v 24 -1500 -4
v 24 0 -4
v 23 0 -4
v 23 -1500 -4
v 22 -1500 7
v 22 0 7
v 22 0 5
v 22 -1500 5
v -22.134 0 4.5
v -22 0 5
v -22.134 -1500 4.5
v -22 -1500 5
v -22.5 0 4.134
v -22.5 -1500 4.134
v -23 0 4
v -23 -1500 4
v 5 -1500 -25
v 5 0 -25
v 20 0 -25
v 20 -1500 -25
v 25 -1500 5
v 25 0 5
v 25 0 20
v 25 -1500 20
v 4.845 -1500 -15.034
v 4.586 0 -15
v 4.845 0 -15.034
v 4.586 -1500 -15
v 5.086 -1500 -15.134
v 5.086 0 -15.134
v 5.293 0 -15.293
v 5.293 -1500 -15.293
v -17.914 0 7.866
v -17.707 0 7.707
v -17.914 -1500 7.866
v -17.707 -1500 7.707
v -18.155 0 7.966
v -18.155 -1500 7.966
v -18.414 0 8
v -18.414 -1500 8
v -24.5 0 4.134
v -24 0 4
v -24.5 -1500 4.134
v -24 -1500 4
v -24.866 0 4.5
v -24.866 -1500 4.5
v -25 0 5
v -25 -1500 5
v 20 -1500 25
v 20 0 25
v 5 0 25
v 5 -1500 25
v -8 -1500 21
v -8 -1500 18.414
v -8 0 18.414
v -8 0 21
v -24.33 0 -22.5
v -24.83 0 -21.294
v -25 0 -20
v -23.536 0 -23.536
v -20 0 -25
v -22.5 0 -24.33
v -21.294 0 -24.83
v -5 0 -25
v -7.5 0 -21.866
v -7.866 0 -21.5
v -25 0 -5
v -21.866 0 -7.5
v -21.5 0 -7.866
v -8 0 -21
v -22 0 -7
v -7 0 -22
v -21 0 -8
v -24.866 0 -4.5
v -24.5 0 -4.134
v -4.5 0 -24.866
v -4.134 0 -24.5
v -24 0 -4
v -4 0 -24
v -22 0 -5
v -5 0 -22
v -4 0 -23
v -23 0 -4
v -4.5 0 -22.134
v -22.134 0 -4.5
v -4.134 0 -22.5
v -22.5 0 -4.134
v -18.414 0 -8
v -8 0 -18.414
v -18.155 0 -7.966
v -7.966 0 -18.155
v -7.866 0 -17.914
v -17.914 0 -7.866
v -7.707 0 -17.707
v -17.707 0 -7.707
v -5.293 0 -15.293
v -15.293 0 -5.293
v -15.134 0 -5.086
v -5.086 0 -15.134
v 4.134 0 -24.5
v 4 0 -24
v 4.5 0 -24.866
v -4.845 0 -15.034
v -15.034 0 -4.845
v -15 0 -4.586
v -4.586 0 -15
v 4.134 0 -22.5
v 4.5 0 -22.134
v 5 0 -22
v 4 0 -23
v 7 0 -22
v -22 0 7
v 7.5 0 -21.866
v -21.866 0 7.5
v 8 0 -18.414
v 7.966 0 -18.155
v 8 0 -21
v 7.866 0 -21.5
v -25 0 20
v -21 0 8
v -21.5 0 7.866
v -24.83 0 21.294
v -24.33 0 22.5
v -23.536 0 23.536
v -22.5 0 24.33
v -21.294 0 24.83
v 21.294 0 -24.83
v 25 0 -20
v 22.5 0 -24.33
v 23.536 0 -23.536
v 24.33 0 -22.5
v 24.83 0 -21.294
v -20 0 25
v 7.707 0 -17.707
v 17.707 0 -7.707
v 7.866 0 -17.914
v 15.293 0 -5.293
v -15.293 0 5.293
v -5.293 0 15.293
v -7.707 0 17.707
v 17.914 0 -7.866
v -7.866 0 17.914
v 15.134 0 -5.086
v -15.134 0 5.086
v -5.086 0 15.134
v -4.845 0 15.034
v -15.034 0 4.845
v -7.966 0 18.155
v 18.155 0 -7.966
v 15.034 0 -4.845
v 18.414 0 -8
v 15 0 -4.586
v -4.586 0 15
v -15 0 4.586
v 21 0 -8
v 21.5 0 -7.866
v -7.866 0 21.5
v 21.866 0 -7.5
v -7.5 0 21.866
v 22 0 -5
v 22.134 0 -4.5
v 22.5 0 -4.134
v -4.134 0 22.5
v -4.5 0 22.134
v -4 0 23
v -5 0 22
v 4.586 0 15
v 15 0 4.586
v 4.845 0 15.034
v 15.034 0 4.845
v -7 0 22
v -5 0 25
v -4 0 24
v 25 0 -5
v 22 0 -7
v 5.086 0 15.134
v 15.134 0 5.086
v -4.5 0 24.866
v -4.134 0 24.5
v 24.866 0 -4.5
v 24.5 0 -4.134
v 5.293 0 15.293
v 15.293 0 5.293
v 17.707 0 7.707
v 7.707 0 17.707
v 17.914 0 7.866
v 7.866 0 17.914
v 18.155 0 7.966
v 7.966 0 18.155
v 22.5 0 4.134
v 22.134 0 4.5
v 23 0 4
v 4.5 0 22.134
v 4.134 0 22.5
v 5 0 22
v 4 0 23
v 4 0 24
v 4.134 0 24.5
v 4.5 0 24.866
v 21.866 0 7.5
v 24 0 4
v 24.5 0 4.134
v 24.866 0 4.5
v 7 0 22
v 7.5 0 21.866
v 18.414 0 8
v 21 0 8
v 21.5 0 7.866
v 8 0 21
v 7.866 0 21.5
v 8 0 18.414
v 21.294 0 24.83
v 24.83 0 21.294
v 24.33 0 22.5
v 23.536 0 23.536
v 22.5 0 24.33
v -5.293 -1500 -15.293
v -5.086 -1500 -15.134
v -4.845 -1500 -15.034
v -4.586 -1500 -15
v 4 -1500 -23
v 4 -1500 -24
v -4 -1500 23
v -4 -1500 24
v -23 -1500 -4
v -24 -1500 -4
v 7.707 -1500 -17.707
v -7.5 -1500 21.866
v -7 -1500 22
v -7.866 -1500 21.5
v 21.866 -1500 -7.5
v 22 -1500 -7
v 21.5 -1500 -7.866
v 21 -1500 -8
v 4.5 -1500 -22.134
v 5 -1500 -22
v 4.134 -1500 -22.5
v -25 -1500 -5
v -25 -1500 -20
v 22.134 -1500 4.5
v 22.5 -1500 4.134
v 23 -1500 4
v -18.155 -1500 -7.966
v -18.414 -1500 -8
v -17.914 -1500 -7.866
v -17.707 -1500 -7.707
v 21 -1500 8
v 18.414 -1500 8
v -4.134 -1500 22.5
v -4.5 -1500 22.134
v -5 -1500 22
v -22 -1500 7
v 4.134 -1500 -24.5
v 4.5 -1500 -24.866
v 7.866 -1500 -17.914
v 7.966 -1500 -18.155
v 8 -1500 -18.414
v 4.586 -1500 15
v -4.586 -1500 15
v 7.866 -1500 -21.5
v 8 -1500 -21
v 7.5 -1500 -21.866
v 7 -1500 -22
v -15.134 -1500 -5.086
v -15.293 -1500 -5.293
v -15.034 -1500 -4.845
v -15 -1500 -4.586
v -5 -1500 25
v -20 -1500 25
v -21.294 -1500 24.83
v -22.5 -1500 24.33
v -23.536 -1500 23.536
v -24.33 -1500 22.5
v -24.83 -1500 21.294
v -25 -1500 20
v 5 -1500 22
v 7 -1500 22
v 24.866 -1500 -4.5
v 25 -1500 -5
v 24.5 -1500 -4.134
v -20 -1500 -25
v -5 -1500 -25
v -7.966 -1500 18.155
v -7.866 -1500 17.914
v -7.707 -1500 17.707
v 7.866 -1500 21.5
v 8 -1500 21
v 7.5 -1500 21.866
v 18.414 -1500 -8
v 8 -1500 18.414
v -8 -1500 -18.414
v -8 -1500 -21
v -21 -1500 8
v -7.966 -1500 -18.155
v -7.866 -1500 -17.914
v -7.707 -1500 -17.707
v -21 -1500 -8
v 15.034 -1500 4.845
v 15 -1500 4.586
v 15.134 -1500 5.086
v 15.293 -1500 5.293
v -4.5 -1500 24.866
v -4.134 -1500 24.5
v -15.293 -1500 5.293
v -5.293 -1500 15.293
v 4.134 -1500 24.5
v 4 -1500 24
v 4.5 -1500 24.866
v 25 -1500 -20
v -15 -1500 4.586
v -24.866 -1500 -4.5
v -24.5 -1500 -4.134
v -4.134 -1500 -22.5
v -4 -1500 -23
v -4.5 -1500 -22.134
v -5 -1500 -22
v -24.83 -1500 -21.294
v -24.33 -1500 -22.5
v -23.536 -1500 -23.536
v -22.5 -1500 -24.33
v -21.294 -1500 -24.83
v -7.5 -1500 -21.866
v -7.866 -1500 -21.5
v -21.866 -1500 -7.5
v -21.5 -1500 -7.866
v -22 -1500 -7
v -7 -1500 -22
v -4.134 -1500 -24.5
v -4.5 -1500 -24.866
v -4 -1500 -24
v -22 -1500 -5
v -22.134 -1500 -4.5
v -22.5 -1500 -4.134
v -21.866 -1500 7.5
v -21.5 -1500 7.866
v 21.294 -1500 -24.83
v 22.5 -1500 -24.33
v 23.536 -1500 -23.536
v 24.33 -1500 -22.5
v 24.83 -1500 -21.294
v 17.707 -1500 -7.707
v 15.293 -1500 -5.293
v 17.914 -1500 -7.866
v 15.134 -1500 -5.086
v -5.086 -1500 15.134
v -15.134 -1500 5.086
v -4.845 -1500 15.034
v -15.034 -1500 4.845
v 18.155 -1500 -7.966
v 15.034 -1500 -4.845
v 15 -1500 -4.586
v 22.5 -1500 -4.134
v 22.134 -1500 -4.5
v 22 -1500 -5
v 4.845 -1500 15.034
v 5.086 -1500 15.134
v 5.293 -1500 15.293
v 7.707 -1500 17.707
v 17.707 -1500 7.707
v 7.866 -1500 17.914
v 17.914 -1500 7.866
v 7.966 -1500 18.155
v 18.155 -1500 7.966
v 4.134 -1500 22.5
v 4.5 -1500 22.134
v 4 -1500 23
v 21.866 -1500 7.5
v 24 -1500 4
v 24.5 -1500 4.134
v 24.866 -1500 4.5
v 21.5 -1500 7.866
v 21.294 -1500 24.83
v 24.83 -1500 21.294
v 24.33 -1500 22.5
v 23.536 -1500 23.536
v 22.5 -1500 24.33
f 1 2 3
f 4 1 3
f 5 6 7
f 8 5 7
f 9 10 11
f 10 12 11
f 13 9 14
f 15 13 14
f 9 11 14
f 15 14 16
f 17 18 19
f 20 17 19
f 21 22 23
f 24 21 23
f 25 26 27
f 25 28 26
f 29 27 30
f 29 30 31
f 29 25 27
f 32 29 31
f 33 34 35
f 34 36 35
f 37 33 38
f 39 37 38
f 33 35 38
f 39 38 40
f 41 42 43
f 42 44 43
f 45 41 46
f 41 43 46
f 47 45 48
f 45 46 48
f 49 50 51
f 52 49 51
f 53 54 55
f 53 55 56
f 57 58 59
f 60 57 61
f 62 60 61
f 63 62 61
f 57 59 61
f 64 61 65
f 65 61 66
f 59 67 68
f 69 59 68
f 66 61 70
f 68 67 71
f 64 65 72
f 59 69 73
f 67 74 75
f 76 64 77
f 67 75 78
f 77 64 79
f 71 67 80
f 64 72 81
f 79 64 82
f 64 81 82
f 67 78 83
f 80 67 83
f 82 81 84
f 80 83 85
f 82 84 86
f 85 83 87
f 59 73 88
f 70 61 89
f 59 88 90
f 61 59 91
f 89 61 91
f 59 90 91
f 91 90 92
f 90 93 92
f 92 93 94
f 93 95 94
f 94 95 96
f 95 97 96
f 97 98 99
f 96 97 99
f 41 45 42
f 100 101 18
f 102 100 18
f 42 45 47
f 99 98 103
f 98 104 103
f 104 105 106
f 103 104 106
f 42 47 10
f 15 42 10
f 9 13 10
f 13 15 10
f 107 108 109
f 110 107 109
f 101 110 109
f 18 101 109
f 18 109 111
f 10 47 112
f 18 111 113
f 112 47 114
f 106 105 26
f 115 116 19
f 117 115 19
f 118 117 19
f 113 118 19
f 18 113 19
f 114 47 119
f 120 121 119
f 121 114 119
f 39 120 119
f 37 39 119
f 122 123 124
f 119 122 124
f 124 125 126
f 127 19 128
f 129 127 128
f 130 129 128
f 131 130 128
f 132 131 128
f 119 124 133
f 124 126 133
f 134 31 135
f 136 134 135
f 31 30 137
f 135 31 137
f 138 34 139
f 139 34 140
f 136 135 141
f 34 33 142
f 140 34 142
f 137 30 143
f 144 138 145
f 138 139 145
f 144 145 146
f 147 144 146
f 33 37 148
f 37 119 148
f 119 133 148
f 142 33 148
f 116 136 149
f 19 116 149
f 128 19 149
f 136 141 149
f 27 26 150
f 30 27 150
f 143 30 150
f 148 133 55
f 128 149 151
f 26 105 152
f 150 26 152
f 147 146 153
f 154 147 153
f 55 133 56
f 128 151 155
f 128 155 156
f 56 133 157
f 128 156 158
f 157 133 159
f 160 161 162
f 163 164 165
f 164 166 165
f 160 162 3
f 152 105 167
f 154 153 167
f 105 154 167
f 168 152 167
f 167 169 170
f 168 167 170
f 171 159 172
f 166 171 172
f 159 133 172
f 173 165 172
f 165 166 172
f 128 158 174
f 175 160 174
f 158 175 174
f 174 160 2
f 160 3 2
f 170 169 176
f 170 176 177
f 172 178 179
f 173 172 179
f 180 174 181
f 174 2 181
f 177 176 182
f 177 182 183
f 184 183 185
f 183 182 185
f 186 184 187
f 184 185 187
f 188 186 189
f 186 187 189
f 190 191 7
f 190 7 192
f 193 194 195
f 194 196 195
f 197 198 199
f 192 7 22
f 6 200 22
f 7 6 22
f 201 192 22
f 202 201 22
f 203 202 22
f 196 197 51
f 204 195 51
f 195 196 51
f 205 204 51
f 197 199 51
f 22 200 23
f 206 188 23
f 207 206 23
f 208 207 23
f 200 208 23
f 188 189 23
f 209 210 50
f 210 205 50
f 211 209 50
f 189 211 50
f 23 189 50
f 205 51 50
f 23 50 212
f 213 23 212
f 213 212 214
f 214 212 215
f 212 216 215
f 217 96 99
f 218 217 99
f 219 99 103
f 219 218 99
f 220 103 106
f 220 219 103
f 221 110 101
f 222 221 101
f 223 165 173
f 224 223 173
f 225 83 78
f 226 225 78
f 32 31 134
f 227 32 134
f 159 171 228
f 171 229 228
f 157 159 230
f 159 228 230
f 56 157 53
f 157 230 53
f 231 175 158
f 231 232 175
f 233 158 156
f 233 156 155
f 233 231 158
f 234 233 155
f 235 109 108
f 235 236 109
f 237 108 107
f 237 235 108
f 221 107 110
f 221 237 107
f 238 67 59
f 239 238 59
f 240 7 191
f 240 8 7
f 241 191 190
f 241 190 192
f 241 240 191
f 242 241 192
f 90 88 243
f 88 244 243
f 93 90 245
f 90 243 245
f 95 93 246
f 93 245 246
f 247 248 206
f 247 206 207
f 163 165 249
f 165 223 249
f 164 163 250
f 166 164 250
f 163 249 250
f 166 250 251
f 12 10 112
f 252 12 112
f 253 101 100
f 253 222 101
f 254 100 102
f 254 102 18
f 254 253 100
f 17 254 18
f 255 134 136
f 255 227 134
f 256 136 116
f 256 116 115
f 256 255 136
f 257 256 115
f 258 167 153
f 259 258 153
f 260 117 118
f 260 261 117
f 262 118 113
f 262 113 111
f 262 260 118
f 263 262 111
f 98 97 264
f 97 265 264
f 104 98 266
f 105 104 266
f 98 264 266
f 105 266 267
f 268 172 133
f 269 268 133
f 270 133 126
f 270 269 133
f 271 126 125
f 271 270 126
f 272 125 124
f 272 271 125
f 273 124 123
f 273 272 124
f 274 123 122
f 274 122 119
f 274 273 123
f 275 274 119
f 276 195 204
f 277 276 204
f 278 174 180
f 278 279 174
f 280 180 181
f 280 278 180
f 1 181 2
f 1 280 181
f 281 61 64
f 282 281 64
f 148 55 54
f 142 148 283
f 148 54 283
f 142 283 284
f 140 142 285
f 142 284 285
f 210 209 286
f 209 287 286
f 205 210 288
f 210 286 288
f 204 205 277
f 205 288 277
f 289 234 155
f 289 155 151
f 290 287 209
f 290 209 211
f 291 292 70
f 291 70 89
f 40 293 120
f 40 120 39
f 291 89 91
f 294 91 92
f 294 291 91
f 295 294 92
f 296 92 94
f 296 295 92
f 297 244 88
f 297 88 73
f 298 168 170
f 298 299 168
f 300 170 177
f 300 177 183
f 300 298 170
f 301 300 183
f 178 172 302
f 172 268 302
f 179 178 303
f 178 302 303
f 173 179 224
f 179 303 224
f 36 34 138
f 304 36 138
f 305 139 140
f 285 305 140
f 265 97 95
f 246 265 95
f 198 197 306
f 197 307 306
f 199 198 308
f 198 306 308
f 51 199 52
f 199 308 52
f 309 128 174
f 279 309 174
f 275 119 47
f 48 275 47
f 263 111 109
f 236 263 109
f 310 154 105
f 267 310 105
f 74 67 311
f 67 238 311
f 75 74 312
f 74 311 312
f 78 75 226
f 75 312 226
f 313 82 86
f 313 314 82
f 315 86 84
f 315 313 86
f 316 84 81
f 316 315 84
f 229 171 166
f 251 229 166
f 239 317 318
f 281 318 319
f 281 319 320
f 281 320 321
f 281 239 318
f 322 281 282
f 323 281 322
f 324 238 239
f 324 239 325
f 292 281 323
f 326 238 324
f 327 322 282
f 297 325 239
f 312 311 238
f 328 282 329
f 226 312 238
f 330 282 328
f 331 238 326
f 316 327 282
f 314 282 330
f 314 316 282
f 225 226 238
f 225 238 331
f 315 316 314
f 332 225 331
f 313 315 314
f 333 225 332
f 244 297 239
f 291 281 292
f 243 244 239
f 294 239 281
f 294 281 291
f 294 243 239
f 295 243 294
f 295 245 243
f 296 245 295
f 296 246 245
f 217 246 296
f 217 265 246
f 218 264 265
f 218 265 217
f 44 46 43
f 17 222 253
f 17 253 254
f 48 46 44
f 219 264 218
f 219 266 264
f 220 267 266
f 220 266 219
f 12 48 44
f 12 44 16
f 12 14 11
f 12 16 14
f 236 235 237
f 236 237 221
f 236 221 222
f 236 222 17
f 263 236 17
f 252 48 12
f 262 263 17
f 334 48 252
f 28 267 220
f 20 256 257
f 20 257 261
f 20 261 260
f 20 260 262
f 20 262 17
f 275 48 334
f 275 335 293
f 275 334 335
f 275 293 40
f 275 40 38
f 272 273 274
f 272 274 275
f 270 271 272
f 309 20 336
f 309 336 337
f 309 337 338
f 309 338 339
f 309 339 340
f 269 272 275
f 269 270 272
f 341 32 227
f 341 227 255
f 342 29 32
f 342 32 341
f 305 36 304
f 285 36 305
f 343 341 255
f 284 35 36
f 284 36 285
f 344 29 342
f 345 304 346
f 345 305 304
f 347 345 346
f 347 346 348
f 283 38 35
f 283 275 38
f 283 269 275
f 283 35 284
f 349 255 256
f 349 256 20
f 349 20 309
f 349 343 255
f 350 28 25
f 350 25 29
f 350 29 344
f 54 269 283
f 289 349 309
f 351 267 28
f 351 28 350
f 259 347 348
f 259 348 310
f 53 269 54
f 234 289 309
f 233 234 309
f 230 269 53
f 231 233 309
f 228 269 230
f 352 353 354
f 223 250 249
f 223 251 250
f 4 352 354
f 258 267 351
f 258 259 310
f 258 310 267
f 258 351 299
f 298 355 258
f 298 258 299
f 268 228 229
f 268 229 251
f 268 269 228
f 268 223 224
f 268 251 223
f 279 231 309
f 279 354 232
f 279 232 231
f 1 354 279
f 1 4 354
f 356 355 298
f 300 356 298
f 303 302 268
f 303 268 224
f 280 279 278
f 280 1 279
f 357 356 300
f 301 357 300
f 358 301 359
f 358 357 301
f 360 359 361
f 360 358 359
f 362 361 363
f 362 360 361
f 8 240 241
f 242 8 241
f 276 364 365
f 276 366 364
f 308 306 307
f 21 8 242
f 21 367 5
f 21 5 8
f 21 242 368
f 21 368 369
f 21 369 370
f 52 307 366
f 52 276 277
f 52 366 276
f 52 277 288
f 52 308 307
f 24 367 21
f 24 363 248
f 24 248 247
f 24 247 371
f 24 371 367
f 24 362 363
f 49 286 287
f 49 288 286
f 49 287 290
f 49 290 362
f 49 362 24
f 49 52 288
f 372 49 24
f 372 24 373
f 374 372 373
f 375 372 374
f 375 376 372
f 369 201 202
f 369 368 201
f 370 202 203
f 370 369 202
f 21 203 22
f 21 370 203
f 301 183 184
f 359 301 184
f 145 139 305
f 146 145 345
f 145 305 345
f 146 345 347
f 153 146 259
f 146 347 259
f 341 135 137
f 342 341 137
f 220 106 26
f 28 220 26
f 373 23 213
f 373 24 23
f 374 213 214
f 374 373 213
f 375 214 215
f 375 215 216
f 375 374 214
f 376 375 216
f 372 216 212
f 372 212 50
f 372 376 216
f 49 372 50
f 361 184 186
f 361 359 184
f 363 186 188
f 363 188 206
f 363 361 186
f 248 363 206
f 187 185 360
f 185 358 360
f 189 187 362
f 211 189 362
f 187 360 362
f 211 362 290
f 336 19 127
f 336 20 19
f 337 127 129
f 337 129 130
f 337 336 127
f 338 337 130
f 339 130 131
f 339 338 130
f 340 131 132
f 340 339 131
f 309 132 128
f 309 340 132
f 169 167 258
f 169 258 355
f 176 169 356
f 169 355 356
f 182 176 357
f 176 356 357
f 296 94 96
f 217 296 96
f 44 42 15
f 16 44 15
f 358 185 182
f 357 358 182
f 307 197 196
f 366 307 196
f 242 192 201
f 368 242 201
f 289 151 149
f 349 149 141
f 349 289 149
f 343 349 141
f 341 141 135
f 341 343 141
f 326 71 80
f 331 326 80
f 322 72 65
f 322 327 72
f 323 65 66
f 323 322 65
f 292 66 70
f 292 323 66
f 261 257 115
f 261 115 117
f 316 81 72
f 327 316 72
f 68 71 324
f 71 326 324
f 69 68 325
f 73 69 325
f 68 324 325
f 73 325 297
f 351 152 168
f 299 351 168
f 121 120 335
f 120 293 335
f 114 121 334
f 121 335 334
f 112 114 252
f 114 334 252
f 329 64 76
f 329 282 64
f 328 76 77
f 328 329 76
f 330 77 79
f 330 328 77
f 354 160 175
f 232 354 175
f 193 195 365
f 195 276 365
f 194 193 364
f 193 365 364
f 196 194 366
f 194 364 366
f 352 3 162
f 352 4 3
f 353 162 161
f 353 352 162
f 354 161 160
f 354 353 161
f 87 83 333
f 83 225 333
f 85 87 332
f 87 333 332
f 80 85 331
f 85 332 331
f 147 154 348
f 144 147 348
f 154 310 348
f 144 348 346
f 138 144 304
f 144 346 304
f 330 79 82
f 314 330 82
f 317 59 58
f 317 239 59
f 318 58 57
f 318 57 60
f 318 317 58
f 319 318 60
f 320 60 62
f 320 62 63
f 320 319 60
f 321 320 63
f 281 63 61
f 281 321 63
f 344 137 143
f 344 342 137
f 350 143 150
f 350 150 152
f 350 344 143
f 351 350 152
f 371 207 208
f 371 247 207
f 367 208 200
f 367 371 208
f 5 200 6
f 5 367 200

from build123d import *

# Parameters (mm, degrees)
F1_DEPTH = 1500
F2_R     = 5
F3_R     = 1


with BuildPart() as f1:
    # F0 (on Front) → F1 (new body)
    with BuildSketch(Plane.XZ):
        Polygon((-15, 5), (-15, 0), (-15, -5), (-18, -8), (-22, -8), (-22, -4), (-25, -4), (-25, -25), (-4, -25), (-4, -22), (-8, -22), (-8, -18), (-5, -15), (0, -15), (5, -15), (8, -18), (8, -22), (4, -22), (4, -25), (25, -25), (25, -4), (22, -4), (22, -8), (18, -8), (15, -5), (15, 0), (15, 5), (18, 8), (22, 8), (22, 4), (25, 4), (25, 25), (4, 25), (4, 22), (8, 22), (8, 18), (5, 15), (0, 15), (-5, 15), (-8, 18), (-8, 22), (-4, 22), (-4, 25), (-25, 25), (-25, 4), (-22, 4), (-22, 8), (-18, 8), align=None)
    extrude(amount=F1_DEPTH)

    # F2
    f2_edges = [f1.edges().sort_by_distance(p)[0] for p in [
        (25, -750, 25),
        (25, -750, -25),
        (-25, -750, 25),
        (-25, -750, -25),
    ]]
    fillet(f2_edges, radius=F2_R)

    # F3
    f3_edges = [f1.edges().sort_by_distance(p)[0] for p in [
        (-4, -750, 25),
        (4, -750, 25),
        (4, -750, 22),
        (8, -750, 18),
        (5, -750, 15),
        (-8, -750, 18),
        (-5, -750, 15),
        (-8, -750, 22),
        (15, -750, 5),
        (15, -750, -5),
        (22, -750, 8),
        (22, -750, 4),
        (25, -750, 4),
        (8, -750, 22),
        (-4, -750, 22),
        (18, -750, -8),
        (22, -750, -8),
        (22, -750, -4),
        (25, -750, -4),
        (4, -750, -25),
        (8, -750, -22),
        (-8, -750, -18),
        (-5, -750, -15),
        (-4, -750, -22),
        (-4, -750, -25),
        (-8, -750, -22),
        (18, -750, 8),
        (8, -750, -18),
        (5, -750, -15),
        (4, -750, -22),
        (-25, -750, 4),
        (-22, -750, 4),
        (-22, -750, 8),
        (-18, -750, 8),
        (-22, -750, -4),
        (-25, -750, -4),
        (-18, -750, -8),
        (-15, -750, 5),
        (-15, -750, -5),
        (-22, -750, -8),
    ]]
    fillet(f3_edges, radius=F3_R)


solid = f1.part
